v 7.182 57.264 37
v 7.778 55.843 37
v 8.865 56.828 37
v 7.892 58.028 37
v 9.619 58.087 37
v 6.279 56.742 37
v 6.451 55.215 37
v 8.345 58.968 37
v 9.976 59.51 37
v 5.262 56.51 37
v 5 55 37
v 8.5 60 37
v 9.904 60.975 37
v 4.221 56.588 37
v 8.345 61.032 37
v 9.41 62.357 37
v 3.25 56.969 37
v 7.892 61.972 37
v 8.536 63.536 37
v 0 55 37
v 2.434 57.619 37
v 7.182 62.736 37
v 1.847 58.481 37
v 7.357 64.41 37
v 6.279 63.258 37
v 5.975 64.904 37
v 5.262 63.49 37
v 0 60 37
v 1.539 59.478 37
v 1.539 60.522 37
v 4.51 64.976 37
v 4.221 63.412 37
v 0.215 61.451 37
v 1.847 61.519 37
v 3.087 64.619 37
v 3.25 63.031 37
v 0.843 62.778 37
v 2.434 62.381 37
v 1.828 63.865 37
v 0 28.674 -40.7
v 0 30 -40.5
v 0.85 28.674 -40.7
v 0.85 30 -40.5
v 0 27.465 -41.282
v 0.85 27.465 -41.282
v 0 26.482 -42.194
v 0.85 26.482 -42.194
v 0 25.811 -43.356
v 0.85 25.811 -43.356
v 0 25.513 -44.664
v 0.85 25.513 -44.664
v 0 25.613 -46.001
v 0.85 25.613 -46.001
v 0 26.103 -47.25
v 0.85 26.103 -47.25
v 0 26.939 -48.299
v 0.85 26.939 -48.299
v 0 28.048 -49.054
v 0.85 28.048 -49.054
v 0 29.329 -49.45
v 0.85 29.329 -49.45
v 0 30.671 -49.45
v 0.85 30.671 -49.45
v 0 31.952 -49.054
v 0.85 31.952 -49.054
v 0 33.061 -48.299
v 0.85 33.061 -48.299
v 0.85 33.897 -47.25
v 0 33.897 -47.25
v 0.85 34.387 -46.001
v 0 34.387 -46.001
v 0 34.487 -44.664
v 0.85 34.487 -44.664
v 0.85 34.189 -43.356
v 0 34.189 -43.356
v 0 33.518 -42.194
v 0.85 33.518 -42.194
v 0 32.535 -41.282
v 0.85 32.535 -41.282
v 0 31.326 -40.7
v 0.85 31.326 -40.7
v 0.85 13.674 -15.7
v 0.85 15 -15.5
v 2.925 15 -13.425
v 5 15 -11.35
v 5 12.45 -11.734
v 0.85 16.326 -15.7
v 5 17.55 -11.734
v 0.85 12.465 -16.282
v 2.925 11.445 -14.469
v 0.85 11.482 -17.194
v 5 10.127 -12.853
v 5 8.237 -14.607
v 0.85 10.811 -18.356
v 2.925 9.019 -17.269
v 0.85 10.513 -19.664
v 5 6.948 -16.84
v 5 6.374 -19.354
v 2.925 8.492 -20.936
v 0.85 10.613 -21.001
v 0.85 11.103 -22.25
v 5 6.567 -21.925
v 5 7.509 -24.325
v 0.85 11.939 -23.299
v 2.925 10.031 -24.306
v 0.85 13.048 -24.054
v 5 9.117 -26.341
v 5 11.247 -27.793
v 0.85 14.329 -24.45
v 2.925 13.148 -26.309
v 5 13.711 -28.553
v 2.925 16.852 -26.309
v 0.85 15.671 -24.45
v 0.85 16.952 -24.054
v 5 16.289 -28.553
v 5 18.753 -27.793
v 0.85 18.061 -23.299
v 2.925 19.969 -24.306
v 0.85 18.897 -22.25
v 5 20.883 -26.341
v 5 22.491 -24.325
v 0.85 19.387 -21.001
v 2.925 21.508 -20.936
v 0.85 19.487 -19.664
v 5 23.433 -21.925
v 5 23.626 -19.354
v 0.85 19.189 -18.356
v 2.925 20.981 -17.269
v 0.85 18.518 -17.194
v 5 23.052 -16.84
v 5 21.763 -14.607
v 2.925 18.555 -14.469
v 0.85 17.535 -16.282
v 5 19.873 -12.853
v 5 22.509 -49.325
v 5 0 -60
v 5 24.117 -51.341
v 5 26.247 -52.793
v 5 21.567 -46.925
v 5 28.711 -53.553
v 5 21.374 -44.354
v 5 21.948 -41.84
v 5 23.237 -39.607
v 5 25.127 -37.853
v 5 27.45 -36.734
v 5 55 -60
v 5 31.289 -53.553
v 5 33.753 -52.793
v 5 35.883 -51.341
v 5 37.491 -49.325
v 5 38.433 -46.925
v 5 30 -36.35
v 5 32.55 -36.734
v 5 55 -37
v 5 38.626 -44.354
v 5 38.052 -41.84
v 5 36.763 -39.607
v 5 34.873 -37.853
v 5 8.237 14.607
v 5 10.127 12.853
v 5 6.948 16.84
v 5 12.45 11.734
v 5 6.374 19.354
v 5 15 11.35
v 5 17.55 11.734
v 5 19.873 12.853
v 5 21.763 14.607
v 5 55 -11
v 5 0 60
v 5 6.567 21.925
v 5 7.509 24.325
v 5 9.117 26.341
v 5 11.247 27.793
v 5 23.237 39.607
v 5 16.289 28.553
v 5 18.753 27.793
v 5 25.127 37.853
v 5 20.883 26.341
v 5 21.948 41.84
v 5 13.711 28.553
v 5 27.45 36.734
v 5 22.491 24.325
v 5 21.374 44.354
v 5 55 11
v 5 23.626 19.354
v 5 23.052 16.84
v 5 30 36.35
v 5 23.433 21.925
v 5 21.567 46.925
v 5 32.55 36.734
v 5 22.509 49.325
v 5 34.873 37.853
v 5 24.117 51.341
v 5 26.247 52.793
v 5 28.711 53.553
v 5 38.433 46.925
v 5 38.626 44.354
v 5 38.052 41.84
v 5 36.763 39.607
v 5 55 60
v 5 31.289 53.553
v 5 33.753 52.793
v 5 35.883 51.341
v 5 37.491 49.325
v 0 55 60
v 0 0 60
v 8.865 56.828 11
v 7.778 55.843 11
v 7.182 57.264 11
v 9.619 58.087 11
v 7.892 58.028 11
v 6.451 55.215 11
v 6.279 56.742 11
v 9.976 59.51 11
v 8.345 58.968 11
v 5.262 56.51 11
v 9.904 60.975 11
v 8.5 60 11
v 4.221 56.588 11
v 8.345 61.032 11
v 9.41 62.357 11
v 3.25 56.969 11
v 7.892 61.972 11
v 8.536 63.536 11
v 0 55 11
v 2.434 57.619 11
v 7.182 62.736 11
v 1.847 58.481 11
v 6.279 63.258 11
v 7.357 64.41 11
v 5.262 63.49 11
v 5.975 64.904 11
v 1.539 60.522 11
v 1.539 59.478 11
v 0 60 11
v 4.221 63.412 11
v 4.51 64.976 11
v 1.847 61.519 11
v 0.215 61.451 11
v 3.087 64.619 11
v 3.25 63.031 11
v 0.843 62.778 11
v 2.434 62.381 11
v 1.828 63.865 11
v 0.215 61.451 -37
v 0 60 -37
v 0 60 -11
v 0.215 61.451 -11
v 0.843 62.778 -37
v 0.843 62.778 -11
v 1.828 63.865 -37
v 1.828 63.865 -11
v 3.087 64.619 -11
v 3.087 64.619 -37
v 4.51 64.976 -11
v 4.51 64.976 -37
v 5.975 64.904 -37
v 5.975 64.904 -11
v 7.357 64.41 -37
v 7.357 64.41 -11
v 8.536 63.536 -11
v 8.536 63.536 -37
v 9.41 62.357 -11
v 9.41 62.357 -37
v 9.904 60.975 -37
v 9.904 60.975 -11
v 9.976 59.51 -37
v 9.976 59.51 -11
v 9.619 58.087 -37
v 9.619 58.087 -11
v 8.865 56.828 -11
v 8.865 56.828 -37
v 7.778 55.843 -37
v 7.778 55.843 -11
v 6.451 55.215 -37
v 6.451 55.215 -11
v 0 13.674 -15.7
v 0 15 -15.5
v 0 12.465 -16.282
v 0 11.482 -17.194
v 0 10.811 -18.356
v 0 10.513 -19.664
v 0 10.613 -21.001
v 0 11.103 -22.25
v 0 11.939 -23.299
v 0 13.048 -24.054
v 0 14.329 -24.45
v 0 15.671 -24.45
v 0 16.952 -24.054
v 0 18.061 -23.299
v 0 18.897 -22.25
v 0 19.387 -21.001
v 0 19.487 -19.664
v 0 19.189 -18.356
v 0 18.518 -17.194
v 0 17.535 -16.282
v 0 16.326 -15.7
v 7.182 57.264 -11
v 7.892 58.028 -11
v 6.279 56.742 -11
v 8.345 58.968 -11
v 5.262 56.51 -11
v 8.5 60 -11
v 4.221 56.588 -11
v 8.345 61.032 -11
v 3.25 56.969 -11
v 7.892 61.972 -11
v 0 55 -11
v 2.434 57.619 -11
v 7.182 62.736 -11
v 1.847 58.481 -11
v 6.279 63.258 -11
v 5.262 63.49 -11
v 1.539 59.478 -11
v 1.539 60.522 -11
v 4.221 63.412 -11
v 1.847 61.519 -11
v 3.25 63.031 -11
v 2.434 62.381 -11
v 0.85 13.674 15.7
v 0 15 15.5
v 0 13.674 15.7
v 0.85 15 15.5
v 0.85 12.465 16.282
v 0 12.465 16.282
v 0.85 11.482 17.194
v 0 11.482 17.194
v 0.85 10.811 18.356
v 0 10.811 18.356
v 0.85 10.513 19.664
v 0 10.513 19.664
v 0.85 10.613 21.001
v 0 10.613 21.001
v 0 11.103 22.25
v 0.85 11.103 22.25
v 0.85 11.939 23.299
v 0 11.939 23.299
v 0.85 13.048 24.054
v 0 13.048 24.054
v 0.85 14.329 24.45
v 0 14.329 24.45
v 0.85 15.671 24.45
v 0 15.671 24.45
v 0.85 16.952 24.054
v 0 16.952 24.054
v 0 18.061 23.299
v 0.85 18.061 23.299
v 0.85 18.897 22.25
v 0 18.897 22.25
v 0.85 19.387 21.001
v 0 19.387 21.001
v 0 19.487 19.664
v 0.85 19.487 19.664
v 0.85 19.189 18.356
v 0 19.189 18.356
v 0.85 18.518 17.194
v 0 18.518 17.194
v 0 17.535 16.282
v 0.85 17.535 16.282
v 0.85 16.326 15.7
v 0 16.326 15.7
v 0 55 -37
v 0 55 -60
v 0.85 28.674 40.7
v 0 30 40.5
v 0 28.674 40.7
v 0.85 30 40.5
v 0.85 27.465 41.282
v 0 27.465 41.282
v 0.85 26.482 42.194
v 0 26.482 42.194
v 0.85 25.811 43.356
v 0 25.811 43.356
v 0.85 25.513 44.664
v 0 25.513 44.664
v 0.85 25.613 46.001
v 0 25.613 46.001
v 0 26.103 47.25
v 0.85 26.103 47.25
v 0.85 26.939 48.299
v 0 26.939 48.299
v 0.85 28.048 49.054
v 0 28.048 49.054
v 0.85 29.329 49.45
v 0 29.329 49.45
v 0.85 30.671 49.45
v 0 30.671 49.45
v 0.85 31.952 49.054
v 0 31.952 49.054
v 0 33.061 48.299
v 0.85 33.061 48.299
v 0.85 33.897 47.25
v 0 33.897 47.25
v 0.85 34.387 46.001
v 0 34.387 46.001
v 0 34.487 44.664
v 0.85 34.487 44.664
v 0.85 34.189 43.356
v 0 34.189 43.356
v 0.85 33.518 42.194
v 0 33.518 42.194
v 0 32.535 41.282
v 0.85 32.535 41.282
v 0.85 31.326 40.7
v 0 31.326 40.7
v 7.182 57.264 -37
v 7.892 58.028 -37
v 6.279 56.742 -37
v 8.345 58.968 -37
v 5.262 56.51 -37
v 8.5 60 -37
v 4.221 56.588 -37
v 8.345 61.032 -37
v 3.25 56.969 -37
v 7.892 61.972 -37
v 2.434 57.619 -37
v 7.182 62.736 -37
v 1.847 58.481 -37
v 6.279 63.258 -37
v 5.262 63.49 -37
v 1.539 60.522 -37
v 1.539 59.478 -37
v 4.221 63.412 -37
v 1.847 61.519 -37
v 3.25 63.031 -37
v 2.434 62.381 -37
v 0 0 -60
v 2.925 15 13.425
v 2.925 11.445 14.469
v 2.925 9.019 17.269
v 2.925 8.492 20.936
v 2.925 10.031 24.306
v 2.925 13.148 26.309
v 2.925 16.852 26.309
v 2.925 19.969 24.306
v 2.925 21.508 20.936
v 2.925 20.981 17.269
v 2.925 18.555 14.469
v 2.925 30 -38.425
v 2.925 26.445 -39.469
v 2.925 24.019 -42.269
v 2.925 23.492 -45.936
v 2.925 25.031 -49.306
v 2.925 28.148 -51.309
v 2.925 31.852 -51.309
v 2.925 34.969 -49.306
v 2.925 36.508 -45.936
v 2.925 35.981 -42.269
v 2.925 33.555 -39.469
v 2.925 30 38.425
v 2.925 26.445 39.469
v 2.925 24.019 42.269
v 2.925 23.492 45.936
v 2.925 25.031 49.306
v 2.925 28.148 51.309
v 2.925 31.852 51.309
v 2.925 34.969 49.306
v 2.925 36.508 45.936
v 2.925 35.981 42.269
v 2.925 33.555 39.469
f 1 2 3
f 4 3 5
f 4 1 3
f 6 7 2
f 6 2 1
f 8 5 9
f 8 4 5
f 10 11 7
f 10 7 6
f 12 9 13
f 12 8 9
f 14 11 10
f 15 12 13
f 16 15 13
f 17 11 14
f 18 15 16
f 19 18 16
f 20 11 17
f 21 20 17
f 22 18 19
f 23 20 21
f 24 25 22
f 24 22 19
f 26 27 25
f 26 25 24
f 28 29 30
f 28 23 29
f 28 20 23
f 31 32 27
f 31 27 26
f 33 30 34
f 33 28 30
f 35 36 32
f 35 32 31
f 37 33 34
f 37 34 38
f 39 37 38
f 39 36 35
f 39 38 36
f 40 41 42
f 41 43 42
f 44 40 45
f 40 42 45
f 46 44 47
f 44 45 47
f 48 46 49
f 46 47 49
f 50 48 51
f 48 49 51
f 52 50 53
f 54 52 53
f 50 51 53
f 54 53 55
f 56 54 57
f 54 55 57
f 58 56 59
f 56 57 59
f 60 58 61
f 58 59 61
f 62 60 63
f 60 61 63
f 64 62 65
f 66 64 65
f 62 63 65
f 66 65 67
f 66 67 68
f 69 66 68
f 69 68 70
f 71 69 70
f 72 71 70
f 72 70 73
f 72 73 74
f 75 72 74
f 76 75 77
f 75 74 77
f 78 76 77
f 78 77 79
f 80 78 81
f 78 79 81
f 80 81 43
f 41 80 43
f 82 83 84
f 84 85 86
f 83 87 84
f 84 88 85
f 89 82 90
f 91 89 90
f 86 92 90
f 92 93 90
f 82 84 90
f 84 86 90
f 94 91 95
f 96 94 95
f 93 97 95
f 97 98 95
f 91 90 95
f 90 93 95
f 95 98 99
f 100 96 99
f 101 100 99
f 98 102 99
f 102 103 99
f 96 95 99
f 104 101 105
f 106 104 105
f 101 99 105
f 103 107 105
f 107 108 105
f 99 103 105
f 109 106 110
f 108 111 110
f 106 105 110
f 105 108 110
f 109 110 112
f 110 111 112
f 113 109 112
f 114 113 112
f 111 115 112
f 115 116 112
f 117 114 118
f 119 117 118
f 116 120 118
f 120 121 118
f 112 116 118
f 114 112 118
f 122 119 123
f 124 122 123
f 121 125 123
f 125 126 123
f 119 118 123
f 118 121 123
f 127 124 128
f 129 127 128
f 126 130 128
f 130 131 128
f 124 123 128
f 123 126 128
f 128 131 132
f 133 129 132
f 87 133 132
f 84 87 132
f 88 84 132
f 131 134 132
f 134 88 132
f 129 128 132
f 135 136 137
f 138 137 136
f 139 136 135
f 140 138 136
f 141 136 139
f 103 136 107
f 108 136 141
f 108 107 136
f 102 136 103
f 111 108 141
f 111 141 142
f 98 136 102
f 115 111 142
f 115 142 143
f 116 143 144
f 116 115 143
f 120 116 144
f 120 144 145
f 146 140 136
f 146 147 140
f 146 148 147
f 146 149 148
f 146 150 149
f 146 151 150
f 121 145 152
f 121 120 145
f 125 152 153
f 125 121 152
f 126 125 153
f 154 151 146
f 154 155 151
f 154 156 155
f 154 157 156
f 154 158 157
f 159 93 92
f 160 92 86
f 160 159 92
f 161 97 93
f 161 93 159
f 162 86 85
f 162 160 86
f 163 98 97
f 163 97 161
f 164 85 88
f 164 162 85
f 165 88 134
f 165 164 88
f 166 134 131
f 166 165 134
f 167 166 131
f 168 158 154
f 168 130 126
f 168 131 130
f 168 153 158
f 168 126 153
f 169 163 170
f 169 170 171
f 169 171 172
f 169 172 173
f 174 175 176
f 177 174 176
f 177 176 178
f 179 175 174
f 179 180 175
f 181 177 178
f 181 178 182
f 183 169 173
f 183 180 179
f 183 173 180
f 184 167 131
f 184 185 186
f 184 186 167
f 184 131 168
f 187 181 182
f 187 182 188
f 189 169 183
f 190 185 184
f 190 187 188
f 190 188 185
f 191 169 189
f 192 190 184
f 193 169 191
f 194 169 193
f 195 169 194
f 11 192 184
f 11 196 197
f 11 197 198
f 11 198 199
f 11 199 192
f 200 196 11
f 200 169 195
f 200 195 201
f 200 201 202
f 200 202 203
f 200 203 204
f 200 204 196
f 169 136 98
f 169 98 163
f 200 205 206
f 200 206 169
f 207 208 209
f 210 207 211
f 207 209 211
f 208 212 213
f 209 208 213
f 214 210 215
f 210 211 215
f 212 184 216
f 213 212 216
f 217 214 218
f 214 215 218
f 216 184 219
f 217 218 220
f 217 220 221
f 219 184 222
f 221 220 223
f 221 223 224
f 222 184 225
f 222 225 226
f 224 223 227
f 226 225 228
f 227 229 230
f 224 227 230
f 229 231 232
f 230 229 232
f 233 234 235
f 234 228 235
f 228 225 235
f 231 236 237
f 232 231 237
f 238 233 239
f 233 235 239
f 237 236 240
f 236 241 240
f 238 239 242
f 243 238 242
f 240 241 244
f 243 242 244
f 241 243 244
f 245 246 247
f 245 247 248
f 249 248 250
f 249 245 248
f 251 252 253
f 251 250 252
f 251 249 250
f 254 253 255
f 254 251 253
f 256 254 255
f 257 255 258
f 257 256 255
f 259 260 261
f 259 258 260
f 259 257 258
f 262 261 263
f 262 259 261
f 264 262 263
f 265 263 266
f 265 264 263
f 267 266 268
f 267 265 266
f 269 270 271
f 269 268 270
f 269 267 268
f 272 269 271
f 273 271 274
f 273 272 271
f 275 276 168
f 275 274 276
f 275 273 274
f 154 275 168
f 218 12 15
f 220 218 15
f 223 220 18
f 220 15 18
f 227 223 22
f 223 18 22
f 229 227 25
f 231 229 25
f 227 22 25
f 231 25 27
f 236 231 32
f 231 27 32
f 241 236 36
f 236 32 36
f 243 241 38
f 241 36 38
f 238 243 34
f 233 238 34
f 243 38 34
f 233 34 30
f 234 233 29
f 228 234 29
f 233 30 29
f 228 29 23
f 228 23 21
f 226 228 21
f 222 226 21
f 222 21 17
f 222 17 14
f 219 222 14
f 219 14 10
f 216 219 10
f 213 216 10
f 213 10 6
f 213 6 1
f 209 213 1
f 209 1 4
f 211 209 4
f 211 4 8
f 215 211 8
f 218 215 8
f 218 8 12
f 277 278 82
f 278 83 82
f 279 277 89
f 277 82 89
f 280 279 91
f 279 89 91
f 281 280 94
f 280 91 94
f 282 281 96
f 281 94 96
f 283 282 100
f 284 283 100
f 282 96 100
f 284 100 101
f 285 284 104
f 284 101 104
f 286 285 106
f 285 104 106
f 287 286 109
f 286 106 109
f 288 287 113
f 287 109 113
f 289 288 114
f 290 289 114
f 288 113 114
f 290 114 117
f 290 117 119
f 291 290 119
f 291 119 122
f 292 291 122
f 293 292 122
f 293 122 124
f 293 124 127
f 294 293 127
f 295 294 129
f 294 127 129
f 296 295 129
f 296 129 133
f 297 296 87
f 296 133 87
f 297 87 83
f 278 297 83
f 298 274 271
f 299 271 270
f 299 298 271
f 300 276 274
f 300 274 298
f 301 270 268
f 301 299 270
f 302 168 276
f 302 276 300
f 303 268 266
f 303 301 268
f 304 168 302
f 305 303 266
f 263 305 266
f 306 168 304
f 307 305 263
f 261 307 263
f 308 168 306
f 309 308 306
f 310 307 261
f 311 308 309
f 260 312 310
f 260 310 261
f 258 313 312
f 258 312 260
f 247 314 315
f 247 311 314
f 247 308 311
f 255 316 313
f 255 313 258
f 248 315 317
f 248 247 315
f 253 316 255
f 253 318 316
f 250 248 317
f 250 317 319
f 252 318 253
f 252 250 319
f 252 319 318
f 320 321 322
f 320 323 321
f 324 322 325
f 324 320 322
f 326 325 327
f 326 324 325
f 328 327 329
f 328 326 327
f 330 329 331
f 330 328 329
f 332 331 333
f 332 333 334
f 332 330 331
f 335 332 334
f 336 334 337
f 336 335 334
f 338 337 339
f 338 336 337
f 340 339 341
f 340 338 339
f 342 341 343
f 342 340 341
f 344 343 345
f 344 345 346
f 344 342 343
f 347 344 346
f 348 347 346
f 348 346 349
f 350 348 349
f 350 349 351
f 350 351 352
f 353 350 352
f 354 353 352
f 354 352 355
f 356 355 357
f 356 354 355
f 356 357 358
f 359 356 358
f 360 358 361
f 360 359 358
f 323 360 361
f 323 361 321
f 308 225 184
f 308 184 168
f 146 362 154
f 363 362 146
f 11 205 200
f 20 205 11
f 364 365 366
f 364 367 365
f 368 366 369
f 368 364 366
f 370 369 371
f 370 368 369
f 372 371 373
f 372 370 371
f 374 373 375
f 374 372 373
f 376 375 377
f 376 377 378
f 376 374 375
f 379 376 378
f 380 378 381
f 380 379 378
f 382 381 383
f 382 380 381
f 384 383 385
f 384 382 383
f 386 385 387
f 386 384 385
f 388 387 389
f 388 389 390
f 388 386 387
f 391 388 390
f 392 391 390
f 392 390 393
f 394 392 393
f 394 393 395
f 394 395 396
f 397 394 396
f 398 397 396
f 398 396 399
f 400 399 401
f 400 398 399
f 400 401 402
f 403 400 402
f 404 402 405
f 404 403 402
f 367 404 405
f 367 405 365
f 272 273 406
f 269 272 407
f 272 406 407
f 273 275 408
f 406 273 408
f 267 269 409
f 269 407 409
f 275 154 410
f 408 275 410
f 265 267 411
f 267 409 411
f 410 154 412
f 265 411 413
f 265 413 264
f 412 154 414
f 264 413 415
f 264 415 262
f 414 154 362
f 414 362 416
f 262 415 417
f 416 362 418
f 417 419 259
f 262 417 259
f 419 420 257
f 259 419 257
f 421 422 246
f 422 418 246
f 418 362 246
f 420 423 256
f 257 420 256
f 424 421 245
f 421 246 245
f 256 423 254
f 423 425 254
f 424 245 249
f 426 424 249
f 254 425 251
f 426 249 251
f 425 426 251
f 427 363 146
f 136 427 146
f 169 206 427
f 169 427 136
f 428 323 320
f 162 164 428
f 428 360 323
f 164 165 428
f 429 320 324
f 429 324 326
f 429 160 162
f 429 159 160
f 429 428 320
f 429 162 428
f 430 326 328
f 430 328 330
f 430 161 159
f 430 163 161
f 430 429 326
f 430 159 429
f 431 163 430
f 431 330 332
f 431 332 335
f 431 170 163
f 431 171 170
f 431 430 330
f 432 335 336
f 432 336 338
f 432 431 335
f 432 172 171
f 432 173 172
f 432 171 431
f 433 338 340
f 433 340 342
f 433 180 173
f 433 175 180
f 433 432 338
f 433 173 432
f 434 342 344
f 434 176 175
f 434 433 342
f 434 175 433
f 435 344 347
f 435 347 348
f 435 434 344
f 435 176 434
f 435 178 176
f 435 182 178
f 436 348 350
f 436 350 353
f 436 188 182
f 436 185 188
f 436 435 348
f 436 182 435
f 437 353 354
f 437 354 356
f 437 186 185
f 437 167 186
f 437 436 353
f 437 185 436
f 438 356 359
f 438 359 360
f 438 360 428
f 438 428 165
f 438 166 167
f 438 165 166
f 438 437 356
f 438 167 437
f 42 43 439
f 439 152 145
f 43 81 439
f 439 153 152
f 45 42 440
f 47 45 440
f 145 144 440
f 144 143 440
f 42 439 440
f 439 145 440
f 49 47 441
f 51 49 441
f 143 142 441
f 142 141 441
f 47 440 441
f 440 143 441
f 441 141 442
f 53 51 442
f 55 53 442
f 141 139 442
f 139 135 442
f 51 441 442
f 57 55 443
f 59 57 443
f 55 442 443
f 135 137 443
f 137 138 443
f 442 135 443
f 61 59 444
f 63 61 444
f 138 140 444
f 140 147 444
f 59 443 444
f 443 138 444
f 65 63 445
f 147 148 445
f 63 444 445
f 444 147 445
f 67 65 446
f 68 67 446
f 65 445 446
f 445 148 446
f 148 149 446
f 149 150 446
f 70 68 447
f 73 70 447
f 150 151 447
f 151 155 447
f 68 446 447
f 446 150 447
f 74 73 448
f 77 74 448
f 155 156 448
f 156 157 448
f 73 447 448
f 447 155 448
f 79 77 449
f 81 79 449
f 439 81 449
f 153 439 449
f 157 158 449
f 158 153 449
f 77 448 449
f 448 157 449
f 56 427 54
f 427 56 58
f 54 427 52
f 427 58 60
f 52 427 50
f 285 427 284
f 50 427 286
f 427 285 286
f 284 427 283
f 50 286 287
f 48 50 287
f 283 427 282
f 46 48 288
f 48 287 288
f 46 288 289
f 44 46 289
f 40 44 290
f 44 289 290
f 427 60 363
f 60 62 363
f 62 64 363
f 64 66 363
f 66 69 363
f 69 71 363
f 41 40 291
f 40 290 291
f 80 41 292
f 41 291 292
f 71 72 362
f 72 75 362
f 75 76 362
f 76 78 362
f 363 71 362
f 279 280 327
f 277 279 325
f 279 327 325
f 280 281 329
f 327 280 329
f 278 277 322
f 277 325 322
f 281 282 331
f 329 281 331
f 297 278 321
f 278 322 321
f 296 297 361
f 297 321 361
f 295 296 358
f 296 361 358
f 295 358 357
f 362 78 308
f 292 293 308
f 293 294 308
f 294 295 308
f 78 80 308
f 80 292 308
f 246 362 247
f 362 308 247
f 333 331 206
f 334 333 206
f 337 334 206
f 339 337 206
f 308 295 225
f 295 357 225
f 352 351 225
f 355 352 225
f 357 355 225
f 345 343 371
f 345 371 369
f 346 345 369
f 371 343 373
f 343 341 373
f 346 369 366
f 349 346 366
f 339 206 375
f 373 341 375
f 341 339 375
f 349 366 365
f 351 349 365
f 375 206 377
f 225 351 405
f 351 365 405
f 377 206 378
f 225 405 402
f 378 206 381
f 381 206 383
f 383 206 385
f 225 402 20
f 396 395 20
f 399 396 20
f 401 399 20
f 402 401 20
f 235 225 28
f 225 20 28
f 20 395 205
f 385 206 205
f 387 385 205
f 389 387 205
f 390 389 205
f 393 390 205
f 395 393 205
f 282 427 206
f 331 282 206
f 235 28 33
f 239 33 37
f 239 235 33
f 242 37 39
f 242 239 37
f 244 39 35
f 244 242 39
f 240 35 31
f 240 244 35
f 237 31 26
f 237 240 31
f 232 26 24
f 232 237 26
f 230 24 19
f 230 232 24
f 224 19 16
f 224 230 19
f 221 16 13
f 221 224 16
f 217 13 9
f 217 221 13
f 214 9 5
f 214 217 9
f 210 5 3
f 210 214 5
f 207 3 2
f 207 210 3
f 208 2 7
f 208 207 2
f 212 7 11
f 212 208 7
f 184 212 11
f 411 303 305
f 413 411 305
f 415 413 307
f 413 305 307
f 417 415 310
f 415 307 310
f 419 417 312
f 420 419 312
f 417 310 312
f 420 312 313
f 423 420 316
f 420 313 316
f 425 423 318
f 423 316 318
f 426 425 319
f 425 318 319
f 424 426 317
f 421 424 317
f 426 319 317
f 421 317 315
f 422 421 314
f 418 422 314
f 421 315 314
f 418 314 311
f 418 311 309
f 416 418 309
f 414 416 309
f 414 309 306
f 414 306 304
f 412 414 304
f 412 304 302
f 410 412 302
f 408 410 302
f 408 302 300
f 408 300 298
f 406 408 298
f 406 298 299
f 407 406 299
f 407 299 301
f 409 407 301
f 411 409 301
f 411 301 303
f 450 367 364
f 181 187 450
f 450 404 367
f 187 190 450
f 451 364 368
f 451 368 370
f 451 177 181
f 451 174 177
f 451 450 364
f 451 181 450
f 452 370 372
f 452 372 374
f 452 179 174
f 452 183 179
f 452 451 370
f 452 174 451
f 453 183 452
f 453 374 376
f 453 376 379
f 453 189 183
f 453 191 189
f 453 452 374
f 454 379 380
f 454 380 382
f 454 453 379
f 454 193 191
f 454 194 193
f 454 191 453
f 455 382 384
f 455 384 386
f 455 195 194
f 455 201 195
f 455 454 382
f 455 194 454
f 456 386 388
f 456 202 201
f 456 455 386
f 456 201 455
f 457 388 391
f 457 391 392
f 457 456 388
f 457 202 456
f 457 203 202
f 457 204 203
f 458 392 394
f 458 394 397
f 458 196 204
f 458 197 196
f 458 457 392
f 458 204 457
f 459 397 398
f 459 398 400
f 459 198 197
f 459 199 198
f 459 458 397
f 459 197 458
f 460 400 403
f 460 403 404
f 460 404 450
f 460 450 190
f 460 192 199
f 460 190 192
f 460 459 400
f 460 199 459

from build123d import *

# Parameters (mm, degrees)
SKETCH_1_W                 = 5
SKETCH_1_H                 = 60
EXTRUDE_1_DEPTH            = 60
SKETCH_2_R                 = 5
SKETCH_4_R                 = 3.5
CUT_EXTRUDE_1_DEPTH        = 137.839321834
HOLE_WIZARD_M81_AT_2_COUNT = 2
HOLE_WIZARD_M81_AT_2_PITCH = 29.154759474
CUT_EXTRUDE_2_DEPTH        = 89.600225733
CUT_EXTRUDE_2_DEPTH_BACK   = 89.600225733
SKETCH_7_W                 = 23
SKETCH_7_H                 = 10
SKETCH_7_W_2               = 22


with BuildPart() as part:
    # Эскиз1 → Вытянуть-Тонкостенный1 (new, symmetric)
    with BuildSketch(Plane.XY):
        with Locations((2.5, 30)):
            Rectangle(SKETCH_1_W, SKETCH_1_H)
    extrude(amount=EXTRUDE_1_DEPTH, both=True)

    # По траектории1: sweep along a curve in space
    with BuildLine() as sweep_1_path:
        Line((5, 60, 60), (5, 60, -60))
    # Эскиз2 → По траектории1 (sweep)
    with BuildSketch(Plane.XY.offset(60)):
        with Locations((5, 60)):
            Circle(SKETCH_2_R)
    sweep(path=sweep_1_path.line)

    # Эскиз4 → Вырез-Вытянуть1 (cut, through all)
    with BuildSketch(Plane.XY.offset(60)):
        with Locations((5, 60)):
            Circle(SKETCH_4_R)
    extrude(amount=-CUT_EXTRUDE_1_DEPTH, mode=Mode.SUBTRACT)

    # Эскиз5 → Зенковка для  винта с плоской головкой M81 (revolve, cut)
    with BuildSketch(Plane(origin=(5, 30, 45), x_dir=(0, 0, -1), z_dir=(0, 1, 0))):
        Polygon((0, 0), (0, 5), (4.5, 5), (4.5, 4.15), (8.65, 0), align=None)
    hole_wizard_m81 = revolve(axis=Axis((11.35, 30, 45), (-1, 0, 0)), mode=Mode.SUBTRACT)

    # Зенковка для  винта с плоской головкой M81 at 2: Зенковка для  винта с плоской головкой M81 ×2
    with Locations(*[Vector(0, -0.5144957554275265, -0.8574929257125442) * (i * HOLE_WIZARD_M81_AT_2_PITCH) for i in range(1, HOLE_WIZARD_M81_AT_2_COUNT)]):
        add(hole_wizard_m81, mode=Mode.SUBTRACT)

    # Зеркальное отражение1: Зенковка для  винта с плоской головкой M81 across plane
    add(hole_wizard_m81.mirror(Plane.XY), mode=Mode.SUBTRACT)

    # Зеркальное отражение1 copy 1 sketch → Зеркальное отражение1 copy 1 (revolve, cut)
    with BuildSketch(Plane(origin=(5, 15, -20), x_dir=(0, 0, 1), z_dir=(0, 1, 0))):
        Polygon((0, 0), (0, -5), (4.5, -5), (4.5, -4.15), (8.65, 0), align=None)
    revolve(axis=Axis((11.35, 15, -20), (1, 0, 0)), mode=Mode.SUBTRACT)

    # Эскиз7 → Вырез-Вытянуть2 (cut, two sides: drawn at the far end of the back side and taken through both)
    with BuildSketch(Plane(origin=(5, 0, 0), x_dir=(0, 0, -1), z_dir=(1, 0, 0)).offset(-CUT_EXTRUDE_2_DEPTH_BACK)):
        with Locations((48.5, 60)):
            Rectangle(SKETCH_7_W, SKETCH_7_H)
        with Locations((0, 60)):
            Rectangle(SKETCH_7_W_2, SKETCH_7_H)
        with Locations((-48.5, 60)):
            Rectangle(SKETCH_7_W, SKETCH_7_H)
    extrude(amount=CUT_EXTRUDE_2_DEPTH + CUT_EXTRUDE_2_DEPTH_BACK, mode=Mode.SUBTRACT)


solid = part.part
